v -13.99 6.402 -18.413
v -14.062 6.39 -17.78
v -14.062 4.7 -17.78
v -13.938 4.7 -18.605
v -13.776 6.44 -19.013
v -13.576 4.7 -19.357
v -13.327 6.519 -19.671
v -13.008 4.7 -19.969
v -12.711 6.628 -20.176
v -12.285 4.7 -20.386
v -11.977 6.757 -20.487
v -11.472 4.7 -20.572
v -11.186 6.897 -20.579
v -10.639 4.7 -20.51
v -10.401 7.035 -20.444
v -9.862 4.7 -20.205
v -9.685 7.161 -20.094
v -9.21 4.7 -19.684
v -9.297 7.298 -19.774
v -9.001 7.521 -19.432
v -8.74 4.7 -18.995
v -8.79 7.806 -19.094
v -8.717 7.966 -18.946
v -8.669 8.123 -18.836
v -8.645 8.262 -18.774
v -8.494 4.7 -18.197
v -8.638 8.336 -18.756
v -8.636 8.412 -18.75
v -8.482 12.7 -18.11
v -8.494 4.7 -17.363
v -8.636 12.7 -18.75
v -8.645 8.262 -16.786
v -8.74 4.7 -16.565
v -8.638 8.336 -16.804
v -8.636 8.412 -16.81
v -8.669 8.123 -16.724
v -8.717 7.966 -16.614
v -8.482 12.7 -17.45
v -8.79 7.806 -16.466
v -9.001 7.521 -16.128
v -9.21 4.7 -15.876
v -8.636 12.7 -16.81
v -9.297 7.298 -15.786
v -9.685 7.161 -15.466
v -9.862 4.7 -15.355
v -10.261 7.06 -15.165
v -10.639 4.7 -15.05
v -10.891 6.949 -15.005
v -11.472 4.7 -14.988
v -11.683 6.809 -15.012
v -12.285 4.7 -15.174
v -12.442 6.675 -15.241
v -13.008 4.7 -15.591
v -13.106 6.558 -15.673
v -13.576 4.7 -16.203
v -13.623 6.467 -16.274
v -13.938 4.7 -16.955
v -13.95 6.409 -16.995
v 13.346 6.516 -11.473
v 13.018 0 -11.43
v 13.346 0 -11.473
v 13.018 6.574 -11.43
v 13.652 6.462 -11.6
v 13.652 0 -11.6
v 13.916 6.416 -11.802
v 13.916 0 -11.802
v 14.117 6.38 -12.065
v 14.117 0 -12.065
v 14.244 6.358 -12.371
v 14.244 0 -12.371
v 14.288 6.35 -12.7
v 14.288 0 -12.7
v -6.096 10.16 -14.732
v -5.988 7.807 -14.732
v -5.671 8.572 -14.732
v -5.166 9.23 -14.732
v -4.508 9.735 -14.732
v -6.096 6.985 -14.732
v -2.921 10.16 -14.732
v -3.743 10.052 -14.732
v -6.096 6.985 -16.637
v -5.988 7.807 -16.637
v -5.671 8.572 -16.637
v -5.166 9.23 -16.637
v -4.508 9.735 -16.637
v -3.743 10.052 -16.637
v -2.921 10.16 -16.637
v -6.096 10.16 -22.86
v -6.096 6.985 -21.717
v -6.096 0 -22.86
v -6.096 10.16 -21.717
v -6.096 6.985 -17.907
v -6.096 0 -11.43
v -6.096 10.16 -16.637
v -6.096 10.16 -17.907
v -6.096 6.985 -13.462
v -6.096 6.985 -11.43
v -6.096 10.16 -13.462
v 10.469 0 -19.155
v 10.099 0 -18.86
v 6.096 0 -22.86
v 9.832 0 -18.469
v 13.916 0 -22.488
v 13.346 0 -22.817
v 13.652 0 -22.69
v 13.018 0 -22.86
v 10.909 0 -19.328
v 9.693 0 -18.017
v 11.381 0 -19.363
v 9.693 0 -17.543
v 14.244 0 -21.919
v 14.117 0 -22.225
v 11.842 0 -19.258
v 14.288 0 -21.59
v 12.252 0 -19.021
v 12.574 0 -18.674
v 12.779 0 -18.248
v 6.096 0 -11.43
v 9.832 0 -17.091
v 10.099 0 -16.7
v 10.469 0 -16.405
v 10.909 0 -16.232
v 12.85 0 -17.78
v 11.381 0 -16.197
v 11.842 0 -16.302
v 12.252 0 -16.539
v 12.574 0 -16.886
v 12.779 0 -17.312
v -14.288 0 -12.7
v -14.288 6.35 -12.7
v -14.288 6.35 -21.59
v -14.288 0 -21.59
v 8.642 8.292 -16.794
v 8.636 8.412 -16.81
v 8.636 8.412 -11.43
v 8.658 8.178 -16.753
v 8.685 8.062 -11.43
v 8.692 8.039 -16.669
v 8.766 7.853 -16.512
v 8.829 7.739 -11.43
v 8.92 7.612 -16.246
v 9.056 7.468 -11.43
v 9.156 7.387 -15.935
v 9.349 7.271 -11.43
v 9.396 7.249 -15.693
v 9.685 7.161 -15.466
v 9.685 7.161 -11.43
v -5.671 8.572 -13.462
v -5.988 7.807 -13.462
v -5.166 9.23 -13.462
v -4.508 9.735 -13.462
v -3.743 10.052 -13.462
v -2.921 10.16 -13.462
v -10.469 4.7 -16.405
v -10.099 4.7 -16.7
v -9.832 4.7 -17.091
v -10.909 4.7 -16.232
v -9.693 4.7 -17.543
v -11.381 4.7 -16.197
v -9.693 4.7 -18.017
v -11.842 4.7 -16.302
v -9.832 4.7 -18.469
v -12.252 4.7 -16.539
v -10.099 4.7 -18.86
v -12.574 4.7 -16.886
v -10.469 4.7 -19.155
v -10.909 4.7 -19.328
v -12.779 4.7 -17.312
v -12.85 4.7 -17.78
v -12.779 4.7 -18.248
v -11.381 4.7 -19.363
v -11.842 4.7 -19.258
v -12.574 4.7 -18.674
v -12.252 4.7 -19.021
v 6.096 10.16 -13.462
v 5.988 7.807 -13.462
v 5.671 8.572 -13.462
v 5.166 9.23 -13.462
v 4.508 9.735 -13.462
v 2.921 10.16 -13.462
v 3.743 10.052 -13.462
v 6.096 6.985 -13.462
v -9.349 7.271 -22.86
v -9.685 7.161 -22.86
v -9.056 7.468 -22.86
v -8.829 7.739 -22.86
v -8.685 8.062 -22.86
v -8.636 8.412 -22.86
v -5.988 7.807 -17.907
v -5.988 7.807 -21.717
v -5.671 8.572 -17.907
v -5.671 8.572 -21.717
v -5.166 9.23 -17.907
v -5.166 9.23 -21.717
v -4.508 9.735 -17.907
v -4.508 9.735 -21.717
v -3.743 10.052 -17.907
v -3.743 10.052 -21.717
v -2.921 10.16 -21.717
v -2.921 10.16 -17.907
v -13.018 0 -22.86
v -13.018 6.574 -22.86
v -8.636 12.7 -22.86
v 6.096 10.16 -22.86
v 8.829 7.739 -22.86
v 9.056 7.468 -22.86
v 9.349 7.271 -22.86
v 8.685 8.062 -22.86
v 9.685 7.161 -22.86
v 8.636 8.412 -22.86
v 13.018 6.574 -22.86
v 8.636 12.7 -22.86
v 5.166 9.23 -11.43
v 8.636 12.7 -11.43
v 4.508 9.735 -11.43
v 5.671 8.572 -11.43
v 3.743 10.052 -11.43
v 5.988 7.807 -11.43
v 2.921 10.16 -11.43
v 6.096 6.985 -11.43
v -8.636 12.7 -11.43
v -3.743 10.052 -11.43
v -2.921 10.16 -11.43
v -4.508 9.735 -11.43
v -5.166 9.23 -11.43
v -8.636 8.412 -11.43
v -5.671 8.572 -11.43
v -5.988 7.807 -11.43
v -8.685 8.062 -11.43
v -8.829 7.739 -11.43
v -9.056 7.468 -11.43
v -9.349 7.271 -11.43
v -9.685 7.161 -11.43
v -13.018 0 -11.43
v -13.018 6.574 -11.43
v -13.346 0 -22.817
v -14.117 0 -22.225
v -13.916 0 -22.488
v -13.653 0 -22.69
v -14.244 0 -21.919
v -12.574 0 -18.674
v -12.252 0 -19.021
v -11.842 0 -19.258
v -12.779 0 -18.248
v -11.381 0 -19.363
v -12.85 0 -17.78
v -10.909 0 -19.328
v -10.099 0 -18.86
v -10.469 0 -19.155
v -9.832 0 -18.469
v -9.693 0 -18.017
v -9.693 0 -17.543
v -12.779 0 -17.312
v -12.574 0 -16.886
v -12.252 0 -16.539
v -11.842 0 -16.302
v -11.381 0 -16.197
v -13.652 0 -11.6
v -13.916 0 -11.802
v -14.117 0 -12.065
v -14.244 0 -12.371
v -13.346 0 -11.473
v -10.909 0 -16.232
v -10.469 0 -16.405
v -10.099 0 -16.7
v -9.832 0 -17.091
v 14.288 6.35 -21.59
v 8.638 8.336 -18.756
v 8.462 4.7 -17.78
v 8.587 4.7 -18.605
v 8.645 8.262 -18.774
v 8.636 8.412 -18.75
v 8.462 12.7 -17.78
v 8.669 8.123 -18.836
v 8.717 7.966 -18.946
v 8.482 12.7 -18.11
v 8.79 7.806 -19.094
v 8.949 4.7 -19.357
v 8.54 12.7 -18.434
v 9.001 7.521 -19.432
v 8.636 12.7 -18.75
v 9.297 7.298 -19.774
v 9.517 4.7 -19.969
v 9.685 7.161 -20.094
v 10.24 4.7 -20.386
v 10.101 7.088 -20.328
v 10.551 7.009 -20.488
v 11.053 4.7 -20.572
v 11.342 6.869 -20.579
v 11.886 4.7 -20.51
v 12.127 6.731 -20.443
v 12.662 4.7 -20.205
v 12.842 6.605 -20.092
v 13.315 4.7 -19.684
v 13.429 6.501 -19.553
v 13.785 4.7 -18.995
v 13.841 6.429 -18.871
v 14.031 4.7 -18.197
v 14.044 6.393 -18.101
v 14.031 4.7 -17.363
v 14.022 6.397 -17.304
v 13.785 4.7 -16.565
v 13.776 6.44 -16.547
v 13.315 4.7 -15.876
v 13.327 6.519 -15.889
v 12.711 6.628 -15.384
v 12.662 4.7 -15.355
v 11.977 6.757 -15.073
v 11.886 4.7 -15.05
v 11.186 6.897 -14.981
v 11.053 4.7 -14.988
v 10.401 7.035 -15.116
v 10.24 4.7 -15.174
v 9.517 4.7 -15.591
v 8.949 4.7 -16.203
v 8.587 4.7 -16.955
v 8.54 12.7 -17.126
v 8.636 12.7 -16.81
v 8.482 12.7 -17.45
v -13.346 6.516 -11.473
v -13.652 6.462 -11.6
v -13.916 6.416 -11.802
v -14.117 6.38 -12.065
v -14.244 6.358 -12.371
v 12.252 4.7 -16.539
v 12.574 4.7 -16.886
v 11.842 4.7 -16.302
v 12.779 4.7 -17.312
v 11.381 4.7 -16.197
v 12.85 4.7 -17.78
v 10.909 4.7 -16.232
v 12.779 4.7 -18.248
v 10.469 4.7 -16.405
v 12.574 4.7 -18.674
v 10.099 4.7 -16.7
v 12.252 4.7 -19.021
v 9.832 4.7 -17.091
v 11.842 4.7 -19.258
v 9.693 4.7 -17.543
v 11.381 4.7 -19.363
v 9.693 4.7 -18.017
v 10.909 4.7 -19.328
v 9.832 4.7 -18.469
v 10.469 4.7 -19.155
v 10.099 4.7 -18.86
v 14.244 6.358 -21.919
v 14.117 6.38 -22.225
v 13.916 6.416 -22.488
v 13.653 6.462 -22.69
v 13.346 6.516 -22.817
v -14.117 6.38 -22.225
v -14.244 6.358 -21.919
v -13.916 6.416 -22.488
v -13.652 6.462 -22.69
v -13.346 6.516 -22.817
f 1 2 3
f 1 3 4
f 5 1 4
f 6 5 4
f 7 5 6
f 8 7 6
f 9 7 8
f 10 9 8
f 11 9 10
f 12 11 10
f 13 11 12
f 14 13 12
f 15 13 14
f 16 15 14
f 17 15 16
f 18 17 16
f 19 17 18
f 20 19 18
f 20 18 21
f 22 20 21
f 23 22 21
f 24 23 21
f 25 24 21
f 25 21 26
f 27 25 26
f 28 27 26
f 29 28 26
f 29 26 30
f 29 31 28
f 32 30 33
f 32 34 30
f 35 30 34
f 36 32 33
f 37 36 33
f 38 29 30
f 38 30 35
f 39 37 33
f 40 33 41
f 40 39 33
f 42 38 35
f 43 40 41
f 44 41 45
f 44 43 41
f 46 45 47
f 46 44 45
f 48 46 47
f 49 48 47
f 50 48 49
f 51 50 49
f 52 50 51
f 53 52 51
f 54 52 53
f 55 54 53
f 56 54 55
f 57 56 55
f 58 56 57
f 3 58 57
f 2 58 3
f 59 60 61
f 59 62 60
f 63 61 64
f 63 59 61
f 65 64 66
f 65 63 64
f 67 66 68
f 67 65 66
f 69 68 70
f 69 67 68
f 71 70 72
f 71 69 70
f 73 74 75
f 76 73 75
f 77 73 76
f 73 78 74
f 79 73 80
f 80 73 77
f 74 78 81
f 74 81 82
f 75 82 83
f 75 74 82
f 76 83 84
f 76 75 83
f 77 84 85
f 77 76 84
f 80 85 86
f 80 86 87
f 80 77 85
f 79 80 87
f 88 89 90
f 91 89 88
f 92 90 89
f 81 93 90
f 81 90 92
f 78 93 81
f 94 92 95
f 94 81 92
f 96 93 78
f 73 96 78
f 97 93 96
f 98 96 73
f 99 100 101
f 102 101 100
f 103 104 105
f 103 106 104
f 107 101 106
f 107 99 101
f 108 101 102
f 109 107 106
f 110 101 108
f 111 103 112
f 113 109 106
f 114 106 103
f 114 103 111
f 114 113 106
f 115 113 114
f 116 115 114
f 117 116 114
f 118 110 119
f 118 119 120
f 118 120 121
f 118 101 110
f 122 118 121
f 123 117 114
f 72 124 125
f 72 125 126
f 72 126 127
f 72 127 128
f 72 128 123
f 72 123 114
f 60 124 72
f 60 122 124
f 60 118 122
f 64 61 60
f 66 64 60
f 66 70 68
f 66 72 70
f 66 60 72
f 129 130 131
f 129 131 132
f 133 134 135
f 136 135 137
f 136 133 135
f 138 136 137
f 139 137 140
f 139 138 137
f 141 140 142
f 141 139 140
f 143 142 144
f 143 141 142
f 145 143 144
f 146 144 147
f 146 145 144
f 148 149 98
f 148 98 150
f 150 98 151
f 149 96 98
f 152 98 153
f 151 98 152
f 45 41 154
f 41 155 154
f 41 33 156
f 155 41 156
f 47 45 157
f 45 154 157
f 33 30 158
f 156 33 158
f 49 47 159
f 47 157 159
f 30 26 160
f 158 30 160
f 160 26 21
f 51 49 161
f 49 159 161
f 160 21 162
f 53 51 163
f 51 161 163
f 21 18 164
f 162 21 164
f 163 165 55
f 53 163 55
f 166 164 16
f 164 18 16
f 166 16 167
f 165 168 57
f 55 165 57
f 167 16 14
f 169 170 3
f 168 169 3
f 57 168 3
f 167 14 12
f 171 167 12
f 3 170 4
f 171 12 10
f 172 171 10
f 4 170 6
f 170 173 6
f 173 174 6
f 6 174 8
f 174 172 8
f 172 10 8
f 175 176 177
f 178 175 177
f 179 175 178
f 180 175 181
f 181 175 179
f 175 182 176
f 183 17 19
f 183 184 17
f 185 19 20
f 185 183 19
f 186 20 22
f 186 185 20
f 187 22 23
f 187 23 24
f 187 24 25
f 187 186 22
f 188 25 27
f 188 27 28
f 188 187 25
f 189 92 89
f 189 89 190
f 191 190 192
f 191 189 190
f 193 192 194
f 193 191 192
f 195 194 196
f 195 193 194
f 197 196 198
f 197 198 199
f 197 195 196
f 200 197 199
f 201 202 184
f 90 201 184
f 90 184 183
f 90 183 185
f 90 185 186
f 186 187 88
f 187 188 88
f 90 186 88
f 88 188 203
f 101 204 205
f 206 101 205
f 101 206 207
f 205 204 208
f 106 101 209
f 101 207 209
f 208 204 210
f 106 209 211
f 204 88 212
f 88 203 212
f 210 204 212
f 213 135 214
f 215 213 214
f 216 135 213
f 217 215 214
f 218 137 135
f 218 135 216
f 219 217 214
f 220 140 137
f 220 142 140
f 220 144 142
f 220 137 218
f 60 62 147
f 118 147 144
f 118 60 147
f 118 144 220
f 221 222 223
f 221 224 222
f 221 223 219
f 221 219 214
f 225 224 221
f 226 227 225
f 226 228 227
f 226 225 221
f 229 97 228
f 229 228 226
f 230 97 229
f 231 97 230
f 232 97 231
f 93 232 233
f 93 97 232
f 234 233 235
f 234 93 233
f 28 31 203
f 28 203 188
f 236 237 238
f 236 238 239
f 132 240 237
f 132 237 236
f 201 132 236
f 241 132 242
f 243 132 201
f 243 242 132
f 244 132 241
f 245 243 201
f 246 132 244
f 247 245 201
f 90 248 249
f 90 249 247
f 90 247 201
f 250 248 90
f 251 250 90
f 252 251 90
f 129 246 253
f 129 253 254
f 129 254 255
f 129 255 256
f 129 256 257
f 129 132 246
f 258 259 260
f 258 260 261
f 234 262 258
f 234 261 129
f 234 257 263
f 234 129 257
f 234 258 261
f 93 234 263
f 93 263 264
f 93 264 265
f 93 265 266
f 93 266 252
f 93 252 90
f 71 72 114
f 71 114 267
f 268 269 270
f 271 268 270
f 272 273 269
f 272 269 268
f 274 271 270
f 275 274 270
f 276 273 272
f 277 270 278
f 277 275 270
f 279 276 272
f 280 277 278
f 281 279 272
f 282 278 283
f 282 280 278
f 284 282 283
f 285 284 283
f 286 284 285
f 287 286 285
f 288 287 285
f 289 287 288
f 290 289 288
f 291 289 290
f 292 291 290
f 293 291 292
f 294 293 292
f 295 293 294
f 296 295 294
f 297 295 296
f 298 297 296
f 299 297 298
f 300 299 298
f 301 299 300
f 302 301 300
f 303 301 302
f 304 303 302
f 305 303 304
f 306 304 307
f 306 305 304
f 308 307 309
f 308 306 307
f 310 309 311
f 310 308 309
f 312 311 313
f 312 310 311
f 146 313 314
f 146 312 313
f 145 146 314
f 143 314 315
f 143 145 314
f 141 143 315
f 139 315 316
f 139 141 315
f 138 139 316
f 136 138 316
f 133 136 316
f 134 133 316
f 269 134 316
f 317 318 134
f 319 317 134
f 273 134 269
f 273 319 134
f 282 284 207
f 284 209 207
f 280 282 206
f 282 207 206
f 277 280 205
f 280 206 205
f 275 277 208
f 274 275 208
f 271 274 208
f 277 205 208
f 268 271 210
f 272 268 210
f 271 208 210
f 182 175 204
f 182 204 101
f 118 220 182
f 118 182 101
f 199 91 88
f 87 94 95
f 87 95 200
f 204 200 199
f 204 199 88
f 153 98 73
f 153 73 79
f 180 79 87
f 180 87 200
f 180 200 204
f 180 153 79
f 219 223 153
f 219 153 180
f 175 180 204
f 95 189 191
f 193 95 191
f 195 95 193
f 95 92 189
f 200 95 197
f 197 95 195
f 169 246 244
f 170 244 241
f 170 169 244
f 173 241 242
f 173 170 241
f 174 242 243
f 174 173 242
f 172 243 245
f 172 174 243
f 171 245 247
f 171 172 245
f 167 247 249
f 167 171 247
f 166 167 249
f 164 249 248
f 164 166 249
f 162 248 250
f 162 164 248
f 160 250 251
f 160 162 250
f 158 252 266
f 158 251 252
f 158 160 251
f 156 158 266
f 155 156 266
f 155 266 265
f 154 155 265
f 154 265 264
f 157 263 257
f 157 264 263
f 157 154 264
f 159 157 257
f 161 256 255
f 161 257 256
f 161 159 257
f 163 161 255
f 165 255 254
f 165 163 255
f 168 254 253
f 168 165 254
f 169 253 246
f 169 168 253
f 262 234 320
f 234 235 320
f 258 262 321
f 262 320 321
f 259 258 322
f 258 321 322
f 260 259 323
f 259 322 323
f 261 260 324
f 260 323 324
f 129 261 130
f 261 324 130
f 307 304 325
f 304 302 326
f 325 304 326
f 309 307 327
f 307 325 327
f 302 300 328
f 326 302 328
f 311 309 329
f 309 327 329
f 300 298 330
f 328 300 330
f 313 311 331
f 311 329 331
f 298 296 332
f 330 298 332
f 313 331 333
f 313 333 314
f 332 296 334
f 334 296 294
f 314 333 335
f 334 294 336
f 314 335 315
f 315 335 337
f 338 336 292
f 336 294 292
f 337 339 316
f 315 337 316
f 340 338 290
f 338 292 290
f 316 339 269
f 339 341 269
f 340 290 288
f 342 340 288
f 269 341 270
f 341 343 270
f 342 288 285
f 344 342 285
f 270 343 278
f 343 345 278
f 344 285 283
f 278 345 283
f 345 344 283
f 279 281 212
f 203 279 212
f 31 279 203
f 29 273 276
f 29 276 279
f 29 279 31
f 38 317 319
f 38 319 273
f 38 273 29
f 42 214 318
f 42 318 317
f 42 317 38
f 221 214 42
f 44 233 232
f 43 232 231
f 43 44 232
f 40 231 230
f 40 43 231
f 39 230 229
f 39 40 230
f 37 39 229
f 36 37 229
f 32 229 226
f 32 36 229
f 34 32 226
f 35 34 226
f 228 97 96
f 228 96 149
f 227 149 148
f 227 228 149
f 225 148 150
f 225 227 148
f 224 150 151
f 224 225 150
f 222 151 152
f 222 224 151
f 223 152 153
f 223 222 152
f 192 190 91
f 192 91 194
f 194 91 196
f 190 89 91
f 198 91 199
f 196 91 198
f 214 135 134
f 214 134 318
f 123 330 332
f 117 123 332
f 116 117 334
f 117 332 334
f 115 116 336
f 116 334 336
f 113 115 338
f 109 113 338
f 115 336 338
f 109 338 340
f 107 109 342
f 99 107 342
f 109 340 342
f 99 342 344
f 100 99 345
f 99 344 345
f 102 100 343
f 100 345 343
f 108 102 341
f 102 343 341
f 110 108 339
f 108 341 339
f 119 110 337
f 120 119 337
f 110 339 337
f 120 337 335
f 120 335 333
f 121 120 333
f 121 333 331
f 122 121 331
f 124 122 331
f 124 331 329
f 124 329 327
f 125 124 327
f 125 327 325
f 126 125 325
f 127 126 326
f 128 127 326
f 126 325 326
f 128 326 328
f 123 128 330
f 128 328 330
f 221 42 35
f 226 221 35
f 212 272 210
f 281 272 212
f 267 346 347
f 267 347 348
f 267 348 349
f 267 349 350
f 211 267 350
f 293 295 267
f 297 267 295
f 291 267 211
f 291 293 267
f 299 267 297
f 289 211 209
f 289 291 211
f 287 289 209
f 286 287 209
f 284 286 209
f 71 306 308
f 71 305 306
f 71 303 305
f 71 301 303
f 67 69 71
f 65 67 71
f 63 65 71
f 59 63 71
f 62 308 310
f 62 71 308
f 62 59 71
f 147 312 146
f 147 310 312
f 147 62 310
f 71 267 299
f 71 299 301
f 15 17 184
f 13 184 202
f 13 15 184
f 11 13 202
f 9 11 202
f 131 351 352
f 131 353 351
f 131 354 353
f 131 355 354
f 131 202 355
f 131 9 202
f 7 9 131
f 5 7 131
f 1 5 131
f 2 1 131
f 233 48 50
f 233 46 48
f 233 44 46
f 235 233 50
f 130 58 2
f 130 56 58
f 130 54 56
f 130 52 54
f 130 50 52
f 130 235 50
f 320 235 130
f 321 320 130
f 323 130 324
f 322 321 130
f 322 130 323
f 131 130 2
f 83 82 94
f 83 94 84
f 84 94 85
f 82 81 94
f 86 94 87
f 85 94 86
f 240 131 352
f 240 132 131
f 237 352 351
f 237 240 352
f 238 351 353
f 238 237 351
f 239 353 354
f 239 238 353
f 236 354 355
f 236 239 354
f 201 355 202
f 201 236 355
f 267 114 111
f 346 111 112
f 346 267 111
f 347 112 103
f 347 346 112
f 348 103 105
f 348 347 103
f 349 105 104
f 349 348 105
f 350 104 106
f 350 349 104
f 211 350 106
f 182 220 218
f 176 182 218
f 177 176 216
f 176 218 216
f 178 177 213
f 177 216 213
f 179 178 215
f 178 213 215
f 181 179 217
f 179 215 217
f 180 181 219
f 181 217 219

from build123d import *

# Parameters (mm, degrees)
BOSS_EXTRUDE1_DEPTH = 22.86
BOSS_EXTRUDE2_DEPTH = 13.462
BOSS_EXTRUDE3_START = -1.27
BOSS_EXTRUDE3_DEPTH = 1.905
BOSS_EXTRUDE4_START = -1.27
BOSS_EXTRUDE4_DEPTH = 3.81
SKETCH8_R           = 2.8
SKETCH8_R_2         = 1.5875
CUT_EXTRUDE1_DEPTH  = 8
SKETCH9_W           = 28.575
SKETCH9_H           = 11.43
CUT_EXTRUDE2_DEPTH  = 13.7
FILLET1_R           = 1.27


with BuildPart() as part:
    # Sketch1 → Boss-Extrude1 (new body)
    with BuildSketch(Plane.XY):
        Polygon((-6.096, 10.16), (6.096, 10.16), (6.096, 0), (14.2875, 0), (14.2875, 6.35), (8.636, 7.346511931), (8.636, 12.7), (-8.636, 12.7), (-8.636, 7.346511931), (-14.2875, 6.35), (-14.2875, 0), (-6.096, 0), align=None)
    extrude(amount=-BOSS_EXTRUDE1_DEPTH)

    # Sketch2 → Boss-Extrude2 (add)
    with BuildSketch(Plane.XY):
        with BuildLine():
            Line((2.921, 10.16), (6.096, 10.16))
            Line((6.096, 10.16), (6.096, 6.985))
            ThreePointArc((6.096, 6.985), (5.16606403, 9.23006403), (2.921, 10.16))
        make_face()
        with BuildLine():
            Line((-6.096, 10.16), (-6.096, 6.985))
            ThreePointArc((-6.096, 6.985), (-5.16606403, 9.23006403), (-2.921, 10.16))
            Line((-2.921, 10.16), (-6.096, 10.16))
        make_face()
    extrude(amount=-BOSS_EXTRUDE2_DEPTH)

    # Sketch3 → Boss-Extrude3 (add)
    with BuildSketch(Plane.XY.offset(-13.462).offset(BOSS_EXTRUDE3_START)):
        with BuildLine():
            Line((-6.096, 10.16), (-6.096, 6.985))
            ThreePointArc((-6.096, 6.985), (-5.16606403, 9.23006403), (-2.921, 10.16))
            Line((-2.921, 10.16), (-6.096, 10.16))
        make_face()
    extrude(amount=-BOSS_EXTRUDE3_DEPTH)

    # Sketch4 → Boss-Extrude4 (add)
    with BuildSketch(Plane.XY.offset(-16.637).offset(BOSS_EXTRUDE4_START)):
        with BuildLine():
            Line((-6.096, 10.16), (-6.096, 6.985))
            ThreePointArc((-6.096, 6.985), (-5.16606403, 9.23006403), (-2.921, 10.16))
            Line((-2.921, 10.16), (-6.096, 10.16))
        make_face()
    extrude(amount=-BOSS_EXTRUDE4_DEPTH)

    # Sketch6 → Cut-Revolve1 (revolve, cut)
    with BuildSketch(Plane.XY.offset(-5.08)):
        Polygon((11.262482277, -1.27), (12.849982277, -1.27), (12.849982277, 6.60347316), (12.849982277, 9.423392242), (11.262482277, 9.423392242), (11.262482277, 6.883392242), align=None)
    cut_revolve1 = revolve(axis=Axis((11.262482277, -1.27, -5.08), (0, -1, 0)), mode=Mode.SUBTRACT)

    # Mirror1: Cut-Revolve1 across plane
    add(cut_revolve1.mirror(Plane(origin=(0, 0, 0), x_dir=(0, 0, 1), z_dir=(1, 0, 0))), mode=Mode.SUBTRACT)

    # Mirror2: Cut-Revolve1 across plane
    add(cut_revolve1.mirror(Plane.XY.offset(-11.43)), mode=Mode.SUBTRACT)

    # Mirror2 copy 1 sketch → Mirror2 copy 1 (revolve, cut)
    with BuildSketch(Plane(origin=(0, 0, -17.78), x_dir=(-1, 0, 0), z_dir=(0, 0, -1))):
        Polygon((11.262482277, -1.27), (12.849982277, -1.27), (12.849982277, 6.60347316), (12.849982277, 9.423392242), (11.262482277, 9.423392242), (11.262482277, 6.883392242), align=None)
    revolve(axis=Axis((-11.262482277, -1.27, -17.78), (0, -1, 0)), mode=Mode.SUBTRACT)

    # Sketch8 → Cut-Extrude1 (cut)
    with BuildSketch(Plane(origin=(0, 12.7, 0), x_dir=(-1, 0, 0), z_dir=(0, -1, 0))):
        with Locations((11.262482277, 17.78)):
            Circle(SKETCH8_R)
        with Locations((11.262482277, 17.78)):
            Circle(SKETCH8_R_2, mode=Mode.SUBTRACT)
        with Locations((11.262482277, 5.08)):
            Circle(SKETCH8_R)
        with Locations((11.262482277, 5.08)):
            Circle(SKETCH8_R_2, mode=Mode.SUBTRACT)
        with Locations((-11.262482277, 5.08)):
            Circle(SKETCH8_R)
        with Locations((-11.262482277, 5.08)):
            Circle(SKETCH8_R_2, mode=Mode.SUBTRACT)
        with Locations((-11.262482277, 17.78)):
            Circle(SKETCH8_R)
        with Locations((-11.262482277, 17.78)):
            Circle(SKETCH8_R_2, mode=Mode.SUBTRACT)
    extrude(amount=CUT_EXTRUDE1_DEPTH, mode=Mode.SUBTRACT)

    # Sketch9 → Cut-Extrude2 (cut, through all)
    with BuildSketch(Plane(origin=(0, 0, 0), x_dir=(-1, 0, 0), z_dir=(0, -1, 0))):
        with Locations((0, 5.715)):
            Rectangle(SKETCH9_W, SKETCH9_H)
    extrude(amount=-CUT_EXTRUDE2_DEPTH, mode=Mode.SUBTRACT)

    # Fillet1
    fillet1_edges = [part.edges().sort_by_distance(p)[0] for p in [
        (-14.2875, 3.175, -22.86),
        (14.2875, 3.175, -22.86),
        (-8.636, 7.346511931, -14.119821979),
        (-8.636, 7.346511931, -20.805178021),
        (8.636, 7.346511931, -20.805178021),
        (8.636, 7.346511931, -14.119821979),
        (14.2875, 3.175, -11.43),
        (-14.2875, 3.175, -11.43),
    ]]
    fillet(fillet1_edges, radius=FILLET1_R)


solid = part.part
